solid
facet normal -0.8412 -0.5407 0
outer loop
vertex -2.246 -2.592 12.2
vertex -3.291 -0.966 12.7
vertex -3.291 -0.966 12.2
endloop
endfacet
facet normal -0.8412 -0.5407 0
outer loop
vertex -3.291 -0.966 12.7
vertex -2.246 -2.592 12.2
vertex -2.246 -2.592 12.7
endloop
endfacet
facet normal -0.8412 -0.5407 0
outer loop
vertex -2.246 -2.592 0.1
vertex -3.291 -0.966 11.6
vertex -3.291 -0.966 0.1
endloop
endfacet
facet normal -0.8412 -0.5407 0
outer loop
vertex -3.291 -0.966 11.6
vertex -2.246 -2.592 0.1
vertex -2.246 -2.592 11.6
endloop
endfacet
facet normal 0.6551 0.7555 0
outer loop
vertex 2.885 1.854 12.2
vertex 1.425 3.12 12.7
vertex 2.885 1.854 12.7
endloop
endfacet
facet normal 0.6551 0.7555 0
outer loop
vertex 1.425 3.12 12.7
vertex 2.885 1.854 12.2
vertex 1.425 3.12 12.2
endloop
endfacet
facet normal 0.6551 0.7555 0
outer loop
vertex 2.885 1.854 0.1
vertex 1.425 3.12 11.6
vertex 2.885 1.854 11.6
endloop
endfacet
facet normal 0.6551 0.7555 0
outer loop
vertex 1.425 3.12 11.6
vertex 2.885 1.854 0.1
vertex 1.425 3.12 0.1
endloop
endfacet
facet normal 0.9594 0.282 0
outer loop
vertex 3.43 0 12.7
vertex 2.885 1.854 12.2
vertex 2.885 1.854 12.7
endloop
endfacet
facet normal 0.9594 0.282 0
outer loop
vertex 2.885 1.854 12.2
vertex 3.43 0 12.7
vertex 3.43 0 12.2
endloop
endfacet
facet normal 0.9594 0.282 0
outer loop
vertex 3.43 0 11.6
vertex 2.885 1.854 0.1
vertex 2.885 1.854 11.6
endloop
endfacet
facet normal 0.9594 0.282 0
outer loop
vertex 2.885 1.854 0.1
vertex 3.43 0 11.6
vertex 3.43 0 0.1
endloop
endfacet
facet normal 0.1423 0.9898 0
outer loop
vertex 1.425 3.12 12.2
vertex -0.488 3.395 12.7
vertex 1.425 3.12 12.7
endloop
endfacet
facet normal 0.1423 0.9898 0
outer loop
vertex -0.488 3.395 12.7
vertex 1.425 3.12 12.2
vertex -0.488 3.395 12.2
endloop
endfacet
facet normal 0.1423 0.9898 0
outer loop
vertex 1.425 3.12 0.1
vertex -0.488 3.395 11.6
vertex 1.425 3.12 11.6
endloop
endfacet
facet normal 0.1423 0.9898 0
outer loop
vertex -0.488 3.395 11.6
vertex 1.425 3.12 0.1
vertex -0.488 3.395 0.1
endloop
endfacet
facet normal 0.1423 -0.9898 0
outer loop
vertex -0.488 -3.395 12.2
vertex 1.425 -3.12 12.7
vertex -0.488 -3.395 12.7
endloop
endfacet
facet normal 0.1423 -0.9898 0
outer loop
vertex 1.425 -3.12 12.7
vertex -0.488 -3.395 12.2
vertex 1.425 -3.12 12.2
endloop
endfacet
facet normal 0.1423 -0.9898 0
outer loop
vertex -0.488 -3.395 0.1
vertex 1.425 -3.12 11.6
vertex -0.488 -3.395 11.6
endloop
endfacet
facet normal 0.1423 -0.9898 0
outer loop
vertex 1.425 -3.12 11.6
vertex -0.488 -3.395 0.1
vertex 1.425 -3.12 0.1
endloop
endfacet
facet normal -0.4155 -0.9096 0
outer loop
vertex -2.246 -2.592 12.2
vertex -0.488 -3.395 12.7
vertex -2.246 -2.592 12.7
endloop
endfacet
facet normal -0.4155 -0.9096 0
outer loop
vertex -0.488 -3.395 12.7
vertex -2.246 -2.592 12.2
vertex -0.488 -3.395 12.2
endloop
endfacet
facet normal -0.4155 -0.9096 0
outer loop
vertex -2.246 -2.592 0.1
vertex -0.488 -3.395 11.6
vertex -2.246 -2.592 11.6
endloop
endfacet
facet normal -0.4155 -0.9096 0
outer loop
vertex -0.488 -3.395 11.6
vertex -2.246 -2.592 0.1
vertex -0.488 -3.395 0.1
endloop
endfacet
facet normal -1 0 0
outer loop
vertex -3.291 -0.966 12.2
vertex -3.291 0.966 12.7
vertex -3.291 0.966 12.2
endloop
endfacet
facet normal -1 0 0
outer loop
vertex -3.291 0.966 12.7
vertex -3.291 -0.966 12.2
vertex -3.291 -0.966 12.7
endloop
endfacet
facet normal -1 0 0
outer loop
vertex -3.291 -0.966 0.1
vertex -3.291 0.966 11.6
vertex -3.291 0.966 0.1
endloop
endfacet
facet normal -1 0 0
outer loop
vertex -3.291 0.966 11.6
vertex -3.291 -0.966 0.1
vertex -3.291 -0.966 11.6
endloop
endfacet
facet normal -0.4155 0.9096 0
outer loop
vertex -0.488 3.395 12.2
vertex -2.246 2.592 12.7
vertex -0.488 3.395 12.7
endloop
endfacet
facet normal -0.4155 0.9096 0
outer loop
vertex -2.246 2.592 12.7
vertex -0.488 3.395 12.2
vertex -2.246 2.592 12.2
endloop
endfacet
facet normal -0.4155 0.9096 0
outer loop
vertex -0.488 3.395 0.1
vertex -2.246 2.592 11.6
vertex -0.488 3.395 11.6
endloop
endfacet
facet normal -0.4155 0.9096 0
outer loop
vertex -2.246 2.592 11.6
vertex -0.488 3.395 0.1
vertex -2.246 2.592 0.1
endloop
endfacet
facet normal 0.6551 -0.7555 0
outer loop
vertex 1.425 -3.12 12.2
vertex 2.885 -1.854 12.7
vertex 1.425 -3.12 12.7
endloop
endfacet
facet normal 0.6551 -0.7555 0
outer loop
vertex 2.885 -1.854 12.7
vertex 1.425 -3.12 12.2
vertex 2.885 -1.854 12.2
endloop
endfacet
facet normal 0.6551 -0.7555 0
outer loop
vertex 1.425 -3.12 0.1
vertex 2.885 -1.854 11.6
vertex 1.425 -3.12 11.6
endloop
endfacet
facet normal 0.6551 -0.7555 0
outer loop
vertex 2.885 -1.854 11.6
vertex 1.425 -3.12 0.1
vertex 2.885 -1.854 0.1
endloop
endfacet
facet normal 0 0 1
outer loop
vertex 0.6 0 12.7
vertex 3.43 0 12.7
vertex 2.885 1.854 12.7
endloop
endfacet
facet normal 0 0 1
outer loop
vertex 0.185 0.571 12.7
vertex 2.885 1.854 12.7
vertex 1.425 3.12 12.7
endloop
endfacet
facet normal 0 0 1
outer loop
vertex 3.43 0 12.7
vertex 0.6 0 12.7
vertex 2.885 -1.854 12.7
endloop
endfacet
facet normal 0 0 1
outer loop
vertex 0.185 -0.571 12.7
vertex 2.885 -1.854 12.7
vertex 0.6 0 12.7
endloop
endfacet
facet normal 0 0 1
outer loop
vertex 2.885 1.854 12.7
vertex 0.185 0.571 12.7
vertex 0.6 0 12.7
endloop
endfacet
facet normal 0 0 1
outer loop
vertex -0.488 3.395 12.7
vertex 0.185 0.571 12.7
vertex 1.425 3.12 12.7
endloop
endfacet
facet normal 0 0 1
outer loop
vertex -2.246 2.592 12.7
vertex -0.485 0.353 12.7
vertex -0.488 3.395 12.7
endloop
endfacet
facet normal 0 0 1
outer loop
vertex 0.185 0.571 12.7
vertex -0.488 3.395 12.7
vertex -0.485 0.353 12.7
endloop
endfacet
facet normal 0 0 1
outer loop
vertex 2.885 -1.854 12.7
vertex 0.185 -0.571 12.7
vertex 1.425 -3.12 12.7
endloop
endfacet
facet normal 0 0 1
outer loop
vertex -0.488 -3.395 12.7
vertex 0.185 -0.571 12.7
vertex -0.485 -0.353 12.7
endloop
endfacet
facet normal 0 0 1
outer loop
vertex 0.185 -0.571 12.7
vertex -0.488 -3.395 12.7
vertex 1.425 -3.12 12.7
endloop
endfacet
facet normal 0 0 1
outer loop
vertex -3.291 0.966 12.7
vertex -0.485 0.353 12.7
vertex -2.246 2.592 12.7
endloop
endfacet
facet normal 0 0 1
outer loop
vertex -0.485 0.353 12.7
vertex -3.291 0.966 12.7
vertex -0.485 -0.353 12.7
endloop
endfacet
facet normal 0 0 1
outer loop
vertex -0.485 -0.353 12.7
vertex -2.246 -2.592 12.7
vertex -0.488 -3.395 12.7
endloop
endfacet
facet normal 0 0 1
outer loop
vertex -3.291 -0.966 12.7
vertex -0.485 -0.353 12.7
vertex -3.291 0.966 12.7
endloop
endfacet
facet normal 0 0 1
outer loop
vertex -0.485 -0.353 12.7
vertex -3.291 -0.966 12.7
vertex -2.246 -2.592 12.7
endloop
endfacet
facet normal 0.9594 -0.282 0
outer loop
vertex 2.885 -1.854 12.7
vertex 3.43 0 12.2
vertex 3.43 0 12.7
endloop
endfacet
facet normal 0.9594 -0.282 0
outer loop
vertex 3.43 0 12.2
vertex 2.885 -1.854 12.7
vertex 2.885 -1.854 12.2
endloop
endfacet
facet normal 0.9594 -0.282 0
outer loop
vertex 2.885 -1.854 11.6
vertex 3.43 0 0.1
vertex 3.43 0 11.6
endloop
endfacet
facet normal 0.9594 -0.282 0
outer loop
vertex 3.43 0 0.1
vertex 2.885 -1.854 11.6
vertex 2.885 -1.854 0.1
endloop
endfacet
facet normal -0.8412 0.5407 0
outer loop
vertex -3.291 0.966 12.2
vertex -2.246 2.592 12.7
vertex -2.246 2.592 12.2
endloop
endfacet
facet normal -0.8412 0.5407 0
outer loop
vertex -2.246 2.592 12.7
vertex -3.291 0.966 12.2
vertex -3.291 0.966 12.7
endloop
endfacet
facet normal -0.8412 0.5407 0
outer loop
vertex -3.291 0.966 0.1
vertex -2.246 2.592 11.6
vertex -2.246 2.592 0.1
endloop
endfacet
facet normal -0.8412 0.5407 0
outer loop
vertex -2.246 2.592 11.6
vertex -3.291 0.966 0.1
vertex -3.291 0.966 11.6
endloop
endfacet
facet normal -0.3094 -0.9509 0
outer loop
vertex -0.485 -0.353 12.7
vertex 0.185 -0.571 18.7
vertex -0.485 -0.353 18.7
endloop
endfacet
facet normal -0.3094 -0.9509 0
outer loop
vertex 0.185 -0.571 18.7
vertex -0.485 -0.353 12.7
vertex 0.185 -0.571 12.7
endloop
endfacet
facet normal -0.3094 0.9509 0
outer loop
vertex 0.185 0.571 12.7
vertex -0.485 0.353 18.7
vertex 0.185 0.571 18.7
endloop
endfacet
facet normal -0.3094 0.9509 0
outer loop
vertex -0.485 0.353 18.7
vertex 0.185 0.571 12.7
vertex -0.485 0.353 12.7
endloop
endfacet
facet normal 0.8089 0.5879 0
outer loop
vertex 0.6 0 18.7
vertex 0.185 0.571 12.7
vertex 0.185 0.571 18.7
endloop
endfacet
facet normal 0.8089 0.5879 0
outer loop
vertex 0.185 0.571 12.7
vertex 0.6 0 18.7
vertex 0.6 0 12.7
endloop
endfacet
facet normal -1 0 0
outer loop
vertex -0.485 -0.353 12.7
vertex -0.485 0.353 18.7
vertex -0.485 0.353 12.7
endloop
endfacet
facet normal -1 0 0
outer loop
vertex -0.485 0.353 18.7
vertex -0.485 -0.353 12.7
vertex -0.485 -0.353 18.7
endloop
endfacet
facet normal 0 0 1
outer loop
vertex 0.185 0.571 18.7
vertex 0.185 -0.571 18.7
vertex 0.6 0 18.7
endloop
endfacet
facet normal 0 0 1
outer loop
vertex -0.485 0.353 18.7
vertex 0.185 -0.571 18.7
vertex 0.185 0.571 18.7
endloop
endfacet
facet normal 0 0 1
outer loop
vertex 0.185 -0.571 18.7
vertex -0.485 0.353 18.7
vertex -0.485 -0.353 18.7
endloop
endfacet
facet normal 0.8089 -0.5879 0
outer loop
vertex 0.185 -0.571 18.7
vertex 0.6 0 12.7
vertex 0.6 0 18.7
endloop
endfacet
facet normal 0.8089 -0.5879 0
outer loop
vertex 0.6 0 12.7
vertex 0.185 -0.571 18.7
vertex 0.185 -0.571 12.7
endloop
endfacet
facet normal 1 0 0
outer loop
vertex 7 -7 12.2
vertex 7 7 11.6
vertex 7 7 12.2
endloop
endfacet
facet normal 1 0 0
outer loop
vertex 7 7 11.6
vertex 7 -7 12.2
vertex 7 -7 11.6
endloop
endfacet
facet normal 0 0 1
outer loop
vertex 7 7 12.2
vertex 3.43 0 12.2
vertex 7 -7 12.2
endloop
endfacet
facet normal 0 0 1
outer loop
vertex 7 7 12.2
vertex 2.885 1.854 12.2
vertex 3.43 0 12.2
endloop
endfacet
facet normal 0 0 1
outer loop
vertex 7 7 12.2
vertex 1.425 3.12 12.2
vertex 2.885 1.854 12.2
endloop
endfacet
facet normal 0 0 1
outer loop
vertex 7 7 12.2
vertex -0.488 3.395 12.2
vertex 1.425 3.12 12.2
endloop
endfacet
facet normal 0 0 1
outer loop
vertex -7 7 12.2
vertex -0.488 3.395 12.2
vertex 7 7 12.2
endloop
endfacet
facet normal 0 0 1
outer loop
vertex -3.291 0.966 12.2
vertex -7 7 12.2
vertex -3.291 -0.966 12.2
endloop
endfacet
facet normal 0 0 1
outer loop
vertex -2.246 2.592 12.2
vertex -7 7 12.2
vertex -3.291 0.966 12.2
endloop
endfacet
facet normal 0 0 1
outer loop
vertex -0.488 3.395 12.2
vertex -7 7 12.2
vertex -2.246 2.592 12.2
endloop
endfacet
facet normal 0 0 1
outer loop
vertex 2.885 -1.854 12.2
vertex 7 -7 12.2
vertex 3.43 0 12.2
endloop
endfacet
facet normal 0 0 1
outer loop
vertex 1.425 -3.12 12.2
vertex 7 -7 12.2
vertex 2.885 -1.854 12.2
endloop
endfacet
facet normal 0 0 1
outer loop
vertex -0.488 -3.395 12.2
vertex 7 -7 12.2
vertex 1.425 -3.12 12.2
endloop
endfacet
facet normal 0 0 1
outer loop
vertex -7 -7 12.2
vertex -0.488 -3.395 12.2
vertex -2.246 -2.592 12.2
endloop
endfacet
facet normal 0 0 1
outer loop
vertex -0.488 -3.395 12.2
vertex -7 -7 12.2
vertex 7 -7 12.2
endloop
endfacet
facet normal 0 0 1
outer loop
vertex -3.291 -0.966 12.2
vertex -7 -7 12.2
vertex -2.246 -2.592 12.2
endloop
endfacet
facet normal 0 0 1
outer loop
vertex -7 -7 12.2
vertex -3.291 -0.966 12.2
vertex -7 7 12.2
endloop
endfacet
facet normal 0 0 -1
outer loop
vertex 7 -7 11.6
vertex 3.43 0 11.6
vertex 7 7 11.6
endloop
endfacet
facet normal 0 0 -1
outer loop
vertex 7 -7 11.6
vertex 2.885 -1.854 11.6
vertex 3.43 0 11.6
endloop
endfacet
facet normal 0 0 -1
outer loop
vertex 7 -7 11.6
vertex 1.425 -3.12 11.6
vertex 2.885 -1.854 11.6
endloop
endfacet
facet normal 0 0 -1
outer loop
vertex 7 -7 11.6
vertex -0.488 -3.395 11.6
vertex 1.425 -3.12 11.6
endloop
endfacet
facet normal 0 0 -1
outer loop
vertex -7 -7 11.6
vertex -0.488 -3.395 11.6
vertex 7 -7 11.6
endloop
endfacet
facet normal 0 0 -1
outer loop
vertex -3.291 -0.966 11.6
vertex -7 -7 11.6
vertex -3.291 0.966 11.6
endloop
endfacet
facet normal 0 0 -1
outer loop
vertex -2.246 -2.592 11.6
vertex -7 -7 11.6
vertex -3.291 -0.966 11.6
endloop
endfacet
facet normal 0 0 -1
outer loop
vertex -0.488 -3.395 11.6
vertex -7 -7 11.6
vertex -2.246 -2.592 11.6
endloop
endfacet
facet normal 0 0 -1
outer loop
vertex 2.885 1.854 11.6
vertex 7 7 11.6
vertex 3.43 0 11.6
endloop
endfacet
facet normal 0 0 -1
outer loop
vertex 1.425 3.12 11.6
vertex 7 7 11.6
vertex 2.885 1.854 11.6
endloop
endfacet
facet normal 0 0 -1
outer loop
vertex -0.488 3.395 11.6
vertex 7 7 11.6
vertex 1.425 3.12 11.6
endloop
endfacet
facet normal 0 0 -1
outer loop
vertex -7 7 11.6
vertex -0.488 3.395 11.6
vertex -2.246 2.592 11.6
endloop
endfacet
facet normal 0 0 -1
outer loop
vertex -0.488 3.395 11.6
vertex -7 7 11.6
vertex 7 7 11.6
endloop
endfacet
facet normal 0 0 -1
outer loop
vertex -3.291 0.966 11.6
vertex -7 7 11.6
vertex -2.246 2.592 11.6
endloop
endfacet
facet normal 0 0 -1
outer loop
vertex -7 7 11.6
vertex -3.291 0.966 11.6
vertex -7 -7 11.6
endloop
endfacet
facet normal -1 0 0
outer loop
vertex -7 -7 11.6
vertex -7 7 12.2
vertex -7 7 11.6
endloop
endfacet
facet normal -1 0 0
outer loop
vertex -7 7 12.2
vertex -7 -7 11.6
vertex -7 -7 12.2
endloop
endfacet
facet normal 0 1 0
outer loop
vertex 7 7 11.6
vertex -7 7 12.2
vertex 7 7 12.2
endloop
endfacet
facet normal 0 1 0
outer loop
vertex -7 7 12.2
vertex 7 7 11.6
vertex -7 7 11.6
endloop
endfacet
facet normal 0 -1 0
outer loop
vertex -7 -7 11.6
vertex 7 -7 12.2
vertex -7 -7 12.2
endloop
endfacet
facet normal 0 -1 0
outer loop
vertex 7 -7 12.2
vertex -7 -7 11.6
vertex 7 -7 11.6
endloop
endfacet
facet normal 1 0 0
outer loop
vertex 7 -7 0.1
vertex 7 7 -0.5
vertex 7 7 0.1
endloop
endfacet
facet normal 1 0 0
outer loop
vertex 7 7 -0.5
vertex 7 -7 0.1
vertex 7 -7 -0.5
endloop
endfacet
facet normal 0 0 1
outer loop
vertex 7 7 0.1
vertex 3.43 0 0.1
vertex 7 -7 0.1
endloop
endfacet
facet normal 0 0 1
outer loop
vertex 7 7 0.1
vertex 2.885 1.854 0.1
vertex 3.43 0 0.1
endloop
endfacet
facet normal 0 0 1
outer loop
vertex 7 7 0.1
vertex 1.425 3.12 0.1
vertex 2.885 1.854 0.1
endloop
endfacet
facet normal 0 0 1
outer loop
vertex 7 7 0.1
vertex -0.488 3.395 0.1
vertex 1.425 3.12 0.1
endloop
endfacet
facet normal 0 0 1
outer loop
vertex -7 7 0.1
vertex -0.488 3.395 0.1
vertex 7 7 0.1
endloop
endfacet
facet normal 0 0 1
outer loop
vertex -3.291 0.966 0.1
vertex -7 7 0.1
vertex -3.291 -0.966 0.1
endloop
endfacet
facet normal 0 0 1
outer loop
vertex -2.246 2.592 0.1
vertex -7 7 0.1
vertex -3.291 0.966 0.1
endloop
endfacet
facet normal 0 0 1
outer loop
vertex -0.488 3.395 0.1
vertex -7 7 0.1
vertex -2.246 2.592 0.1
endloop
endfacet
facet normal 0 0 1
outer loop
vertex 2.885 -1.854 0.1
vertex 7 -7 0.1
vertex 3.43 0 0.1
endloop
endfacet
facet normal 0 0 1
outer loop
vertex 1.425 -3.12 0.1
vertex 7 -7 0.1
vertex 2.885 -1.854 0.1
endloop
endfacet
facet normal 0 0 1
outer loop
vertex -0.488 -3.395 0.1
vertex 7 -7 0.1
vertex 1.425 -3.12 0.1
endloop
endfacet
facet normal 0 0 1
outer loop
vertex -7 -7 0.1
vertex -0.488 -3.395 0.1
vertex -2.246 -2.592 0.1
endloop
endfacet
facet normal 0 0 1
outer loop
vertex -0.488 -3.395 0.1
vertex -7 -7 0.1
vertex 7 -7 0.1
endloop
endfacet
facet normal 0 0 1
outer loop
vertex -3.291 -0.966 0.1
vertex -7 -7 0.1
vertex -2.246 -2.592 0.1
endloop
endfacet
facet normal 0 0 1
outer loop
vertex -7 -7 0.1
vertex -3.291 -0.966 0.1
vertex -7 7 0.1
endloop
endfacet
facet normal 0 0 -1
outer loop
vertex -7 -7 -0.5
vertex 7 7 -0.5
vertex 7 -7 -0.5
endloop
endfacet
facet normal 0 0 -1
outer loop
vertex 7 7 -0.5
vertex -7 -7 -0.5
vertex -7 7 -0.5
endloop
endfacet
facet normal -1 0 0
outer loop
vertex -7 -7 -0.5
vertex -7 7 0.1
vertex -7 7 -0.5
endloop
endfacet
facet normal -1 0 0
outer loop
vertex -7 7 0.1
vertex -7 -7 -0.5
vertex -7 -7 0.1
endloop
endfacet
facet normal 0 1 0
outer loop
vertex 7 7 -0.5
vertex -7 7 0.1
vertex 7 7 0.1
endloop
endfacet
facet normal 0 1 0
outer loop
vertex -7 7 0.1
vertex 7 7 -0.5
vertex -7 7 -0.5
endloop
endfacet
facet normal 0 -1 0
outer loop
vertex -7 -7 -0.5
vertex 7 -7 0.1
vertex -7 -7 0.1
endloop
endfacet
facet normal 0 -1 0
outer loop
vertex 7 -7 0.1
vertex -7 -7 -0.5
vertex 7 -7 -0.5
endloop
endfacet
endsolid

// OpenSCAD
// Parameters
body_diameter_mm = 6.86; //[3.43:13.72:0.01]
body_radius_mm = 3.43; //[1.715:6.86:0.01]
body_height_mm = 12.7; //[6.35:25.4:0.01]
tolerance_mm = 0; //[0:1:0.01]
centered = 0; //[0:1:1]
include_lever = 0; //[0:1:1]
include_threads = 0; //[0:1:1]
include_nut_washer = 0; //[0:1:1]
ref_plane_thickness_mm = 0.6; //[0.3:2:0.1]
ref_plane_size_mm = 14; //[7:28:0.5]
ref_axis_radius_mm = 0.6; //[0.3:2:0.1]
ref_axis_extra_height_mm = 6; //[2:20:0.5]
overlap_mm = 1; //[0.5:2:0.1]
toggle_lever_radius_mm = 1.2; //[0.6:3:0.1]
toggle_lever_length_mm = 10; //[5:25:0.5]
toggle_pivot_ball_radius_mm = 1.6; //[0.8:4:0.1]

// Toggle - Detailed geometry
module toggle() {
  color("Silver") {
    // Pivot Ball
    translate([0, 0, body_height_mm - overlap_mm])
      sphere(r=toggle_pivot_ball_radius_mm);
    // Lever
    translate([0, 0, body_height_mm - overlap_mm])
      cylinder(r=toggle_lever_radius_mm, h=toggle_lever_length_mm, center=false);
  }
}

// Assembly - Combine all parts
module assembly() {
  color("DimGray") {
    // Switch Body
    translate([0, 0, 0])
      cylinder(r=body_radius_mm + tolerance_mm, h=body_height_mm, center=false);
    // Mounting Reference Axis
    translate([0, 0, 0])
      cylinder(r=ref_axis_radius_mm, h=body_height_mm + ref_axis_extra_height_mm, center=false);
    // Top Face Reference Plane
    translate([0, 0, body_height_mm - ref_plane_thickness_mm/2 - overlap_mm/2])
      cube([ref_plane_size_mm, ref_plane_size_mm, ref_plane_thickness_mm], center=true);
    // Bottom Face Reference Plane
    translate([0, 0, ref_plane_thickness_mm/2 - overlap_mm/2])
      cube([ref_plane_size_mm, ref_plane_size_mm, ref_plane_thickness_mm], center=true);
  }
  
  // Toggle Lever (optional)
  if (include_lever) {
    toggle();
  }
}

// Final assembly call
assembly();
